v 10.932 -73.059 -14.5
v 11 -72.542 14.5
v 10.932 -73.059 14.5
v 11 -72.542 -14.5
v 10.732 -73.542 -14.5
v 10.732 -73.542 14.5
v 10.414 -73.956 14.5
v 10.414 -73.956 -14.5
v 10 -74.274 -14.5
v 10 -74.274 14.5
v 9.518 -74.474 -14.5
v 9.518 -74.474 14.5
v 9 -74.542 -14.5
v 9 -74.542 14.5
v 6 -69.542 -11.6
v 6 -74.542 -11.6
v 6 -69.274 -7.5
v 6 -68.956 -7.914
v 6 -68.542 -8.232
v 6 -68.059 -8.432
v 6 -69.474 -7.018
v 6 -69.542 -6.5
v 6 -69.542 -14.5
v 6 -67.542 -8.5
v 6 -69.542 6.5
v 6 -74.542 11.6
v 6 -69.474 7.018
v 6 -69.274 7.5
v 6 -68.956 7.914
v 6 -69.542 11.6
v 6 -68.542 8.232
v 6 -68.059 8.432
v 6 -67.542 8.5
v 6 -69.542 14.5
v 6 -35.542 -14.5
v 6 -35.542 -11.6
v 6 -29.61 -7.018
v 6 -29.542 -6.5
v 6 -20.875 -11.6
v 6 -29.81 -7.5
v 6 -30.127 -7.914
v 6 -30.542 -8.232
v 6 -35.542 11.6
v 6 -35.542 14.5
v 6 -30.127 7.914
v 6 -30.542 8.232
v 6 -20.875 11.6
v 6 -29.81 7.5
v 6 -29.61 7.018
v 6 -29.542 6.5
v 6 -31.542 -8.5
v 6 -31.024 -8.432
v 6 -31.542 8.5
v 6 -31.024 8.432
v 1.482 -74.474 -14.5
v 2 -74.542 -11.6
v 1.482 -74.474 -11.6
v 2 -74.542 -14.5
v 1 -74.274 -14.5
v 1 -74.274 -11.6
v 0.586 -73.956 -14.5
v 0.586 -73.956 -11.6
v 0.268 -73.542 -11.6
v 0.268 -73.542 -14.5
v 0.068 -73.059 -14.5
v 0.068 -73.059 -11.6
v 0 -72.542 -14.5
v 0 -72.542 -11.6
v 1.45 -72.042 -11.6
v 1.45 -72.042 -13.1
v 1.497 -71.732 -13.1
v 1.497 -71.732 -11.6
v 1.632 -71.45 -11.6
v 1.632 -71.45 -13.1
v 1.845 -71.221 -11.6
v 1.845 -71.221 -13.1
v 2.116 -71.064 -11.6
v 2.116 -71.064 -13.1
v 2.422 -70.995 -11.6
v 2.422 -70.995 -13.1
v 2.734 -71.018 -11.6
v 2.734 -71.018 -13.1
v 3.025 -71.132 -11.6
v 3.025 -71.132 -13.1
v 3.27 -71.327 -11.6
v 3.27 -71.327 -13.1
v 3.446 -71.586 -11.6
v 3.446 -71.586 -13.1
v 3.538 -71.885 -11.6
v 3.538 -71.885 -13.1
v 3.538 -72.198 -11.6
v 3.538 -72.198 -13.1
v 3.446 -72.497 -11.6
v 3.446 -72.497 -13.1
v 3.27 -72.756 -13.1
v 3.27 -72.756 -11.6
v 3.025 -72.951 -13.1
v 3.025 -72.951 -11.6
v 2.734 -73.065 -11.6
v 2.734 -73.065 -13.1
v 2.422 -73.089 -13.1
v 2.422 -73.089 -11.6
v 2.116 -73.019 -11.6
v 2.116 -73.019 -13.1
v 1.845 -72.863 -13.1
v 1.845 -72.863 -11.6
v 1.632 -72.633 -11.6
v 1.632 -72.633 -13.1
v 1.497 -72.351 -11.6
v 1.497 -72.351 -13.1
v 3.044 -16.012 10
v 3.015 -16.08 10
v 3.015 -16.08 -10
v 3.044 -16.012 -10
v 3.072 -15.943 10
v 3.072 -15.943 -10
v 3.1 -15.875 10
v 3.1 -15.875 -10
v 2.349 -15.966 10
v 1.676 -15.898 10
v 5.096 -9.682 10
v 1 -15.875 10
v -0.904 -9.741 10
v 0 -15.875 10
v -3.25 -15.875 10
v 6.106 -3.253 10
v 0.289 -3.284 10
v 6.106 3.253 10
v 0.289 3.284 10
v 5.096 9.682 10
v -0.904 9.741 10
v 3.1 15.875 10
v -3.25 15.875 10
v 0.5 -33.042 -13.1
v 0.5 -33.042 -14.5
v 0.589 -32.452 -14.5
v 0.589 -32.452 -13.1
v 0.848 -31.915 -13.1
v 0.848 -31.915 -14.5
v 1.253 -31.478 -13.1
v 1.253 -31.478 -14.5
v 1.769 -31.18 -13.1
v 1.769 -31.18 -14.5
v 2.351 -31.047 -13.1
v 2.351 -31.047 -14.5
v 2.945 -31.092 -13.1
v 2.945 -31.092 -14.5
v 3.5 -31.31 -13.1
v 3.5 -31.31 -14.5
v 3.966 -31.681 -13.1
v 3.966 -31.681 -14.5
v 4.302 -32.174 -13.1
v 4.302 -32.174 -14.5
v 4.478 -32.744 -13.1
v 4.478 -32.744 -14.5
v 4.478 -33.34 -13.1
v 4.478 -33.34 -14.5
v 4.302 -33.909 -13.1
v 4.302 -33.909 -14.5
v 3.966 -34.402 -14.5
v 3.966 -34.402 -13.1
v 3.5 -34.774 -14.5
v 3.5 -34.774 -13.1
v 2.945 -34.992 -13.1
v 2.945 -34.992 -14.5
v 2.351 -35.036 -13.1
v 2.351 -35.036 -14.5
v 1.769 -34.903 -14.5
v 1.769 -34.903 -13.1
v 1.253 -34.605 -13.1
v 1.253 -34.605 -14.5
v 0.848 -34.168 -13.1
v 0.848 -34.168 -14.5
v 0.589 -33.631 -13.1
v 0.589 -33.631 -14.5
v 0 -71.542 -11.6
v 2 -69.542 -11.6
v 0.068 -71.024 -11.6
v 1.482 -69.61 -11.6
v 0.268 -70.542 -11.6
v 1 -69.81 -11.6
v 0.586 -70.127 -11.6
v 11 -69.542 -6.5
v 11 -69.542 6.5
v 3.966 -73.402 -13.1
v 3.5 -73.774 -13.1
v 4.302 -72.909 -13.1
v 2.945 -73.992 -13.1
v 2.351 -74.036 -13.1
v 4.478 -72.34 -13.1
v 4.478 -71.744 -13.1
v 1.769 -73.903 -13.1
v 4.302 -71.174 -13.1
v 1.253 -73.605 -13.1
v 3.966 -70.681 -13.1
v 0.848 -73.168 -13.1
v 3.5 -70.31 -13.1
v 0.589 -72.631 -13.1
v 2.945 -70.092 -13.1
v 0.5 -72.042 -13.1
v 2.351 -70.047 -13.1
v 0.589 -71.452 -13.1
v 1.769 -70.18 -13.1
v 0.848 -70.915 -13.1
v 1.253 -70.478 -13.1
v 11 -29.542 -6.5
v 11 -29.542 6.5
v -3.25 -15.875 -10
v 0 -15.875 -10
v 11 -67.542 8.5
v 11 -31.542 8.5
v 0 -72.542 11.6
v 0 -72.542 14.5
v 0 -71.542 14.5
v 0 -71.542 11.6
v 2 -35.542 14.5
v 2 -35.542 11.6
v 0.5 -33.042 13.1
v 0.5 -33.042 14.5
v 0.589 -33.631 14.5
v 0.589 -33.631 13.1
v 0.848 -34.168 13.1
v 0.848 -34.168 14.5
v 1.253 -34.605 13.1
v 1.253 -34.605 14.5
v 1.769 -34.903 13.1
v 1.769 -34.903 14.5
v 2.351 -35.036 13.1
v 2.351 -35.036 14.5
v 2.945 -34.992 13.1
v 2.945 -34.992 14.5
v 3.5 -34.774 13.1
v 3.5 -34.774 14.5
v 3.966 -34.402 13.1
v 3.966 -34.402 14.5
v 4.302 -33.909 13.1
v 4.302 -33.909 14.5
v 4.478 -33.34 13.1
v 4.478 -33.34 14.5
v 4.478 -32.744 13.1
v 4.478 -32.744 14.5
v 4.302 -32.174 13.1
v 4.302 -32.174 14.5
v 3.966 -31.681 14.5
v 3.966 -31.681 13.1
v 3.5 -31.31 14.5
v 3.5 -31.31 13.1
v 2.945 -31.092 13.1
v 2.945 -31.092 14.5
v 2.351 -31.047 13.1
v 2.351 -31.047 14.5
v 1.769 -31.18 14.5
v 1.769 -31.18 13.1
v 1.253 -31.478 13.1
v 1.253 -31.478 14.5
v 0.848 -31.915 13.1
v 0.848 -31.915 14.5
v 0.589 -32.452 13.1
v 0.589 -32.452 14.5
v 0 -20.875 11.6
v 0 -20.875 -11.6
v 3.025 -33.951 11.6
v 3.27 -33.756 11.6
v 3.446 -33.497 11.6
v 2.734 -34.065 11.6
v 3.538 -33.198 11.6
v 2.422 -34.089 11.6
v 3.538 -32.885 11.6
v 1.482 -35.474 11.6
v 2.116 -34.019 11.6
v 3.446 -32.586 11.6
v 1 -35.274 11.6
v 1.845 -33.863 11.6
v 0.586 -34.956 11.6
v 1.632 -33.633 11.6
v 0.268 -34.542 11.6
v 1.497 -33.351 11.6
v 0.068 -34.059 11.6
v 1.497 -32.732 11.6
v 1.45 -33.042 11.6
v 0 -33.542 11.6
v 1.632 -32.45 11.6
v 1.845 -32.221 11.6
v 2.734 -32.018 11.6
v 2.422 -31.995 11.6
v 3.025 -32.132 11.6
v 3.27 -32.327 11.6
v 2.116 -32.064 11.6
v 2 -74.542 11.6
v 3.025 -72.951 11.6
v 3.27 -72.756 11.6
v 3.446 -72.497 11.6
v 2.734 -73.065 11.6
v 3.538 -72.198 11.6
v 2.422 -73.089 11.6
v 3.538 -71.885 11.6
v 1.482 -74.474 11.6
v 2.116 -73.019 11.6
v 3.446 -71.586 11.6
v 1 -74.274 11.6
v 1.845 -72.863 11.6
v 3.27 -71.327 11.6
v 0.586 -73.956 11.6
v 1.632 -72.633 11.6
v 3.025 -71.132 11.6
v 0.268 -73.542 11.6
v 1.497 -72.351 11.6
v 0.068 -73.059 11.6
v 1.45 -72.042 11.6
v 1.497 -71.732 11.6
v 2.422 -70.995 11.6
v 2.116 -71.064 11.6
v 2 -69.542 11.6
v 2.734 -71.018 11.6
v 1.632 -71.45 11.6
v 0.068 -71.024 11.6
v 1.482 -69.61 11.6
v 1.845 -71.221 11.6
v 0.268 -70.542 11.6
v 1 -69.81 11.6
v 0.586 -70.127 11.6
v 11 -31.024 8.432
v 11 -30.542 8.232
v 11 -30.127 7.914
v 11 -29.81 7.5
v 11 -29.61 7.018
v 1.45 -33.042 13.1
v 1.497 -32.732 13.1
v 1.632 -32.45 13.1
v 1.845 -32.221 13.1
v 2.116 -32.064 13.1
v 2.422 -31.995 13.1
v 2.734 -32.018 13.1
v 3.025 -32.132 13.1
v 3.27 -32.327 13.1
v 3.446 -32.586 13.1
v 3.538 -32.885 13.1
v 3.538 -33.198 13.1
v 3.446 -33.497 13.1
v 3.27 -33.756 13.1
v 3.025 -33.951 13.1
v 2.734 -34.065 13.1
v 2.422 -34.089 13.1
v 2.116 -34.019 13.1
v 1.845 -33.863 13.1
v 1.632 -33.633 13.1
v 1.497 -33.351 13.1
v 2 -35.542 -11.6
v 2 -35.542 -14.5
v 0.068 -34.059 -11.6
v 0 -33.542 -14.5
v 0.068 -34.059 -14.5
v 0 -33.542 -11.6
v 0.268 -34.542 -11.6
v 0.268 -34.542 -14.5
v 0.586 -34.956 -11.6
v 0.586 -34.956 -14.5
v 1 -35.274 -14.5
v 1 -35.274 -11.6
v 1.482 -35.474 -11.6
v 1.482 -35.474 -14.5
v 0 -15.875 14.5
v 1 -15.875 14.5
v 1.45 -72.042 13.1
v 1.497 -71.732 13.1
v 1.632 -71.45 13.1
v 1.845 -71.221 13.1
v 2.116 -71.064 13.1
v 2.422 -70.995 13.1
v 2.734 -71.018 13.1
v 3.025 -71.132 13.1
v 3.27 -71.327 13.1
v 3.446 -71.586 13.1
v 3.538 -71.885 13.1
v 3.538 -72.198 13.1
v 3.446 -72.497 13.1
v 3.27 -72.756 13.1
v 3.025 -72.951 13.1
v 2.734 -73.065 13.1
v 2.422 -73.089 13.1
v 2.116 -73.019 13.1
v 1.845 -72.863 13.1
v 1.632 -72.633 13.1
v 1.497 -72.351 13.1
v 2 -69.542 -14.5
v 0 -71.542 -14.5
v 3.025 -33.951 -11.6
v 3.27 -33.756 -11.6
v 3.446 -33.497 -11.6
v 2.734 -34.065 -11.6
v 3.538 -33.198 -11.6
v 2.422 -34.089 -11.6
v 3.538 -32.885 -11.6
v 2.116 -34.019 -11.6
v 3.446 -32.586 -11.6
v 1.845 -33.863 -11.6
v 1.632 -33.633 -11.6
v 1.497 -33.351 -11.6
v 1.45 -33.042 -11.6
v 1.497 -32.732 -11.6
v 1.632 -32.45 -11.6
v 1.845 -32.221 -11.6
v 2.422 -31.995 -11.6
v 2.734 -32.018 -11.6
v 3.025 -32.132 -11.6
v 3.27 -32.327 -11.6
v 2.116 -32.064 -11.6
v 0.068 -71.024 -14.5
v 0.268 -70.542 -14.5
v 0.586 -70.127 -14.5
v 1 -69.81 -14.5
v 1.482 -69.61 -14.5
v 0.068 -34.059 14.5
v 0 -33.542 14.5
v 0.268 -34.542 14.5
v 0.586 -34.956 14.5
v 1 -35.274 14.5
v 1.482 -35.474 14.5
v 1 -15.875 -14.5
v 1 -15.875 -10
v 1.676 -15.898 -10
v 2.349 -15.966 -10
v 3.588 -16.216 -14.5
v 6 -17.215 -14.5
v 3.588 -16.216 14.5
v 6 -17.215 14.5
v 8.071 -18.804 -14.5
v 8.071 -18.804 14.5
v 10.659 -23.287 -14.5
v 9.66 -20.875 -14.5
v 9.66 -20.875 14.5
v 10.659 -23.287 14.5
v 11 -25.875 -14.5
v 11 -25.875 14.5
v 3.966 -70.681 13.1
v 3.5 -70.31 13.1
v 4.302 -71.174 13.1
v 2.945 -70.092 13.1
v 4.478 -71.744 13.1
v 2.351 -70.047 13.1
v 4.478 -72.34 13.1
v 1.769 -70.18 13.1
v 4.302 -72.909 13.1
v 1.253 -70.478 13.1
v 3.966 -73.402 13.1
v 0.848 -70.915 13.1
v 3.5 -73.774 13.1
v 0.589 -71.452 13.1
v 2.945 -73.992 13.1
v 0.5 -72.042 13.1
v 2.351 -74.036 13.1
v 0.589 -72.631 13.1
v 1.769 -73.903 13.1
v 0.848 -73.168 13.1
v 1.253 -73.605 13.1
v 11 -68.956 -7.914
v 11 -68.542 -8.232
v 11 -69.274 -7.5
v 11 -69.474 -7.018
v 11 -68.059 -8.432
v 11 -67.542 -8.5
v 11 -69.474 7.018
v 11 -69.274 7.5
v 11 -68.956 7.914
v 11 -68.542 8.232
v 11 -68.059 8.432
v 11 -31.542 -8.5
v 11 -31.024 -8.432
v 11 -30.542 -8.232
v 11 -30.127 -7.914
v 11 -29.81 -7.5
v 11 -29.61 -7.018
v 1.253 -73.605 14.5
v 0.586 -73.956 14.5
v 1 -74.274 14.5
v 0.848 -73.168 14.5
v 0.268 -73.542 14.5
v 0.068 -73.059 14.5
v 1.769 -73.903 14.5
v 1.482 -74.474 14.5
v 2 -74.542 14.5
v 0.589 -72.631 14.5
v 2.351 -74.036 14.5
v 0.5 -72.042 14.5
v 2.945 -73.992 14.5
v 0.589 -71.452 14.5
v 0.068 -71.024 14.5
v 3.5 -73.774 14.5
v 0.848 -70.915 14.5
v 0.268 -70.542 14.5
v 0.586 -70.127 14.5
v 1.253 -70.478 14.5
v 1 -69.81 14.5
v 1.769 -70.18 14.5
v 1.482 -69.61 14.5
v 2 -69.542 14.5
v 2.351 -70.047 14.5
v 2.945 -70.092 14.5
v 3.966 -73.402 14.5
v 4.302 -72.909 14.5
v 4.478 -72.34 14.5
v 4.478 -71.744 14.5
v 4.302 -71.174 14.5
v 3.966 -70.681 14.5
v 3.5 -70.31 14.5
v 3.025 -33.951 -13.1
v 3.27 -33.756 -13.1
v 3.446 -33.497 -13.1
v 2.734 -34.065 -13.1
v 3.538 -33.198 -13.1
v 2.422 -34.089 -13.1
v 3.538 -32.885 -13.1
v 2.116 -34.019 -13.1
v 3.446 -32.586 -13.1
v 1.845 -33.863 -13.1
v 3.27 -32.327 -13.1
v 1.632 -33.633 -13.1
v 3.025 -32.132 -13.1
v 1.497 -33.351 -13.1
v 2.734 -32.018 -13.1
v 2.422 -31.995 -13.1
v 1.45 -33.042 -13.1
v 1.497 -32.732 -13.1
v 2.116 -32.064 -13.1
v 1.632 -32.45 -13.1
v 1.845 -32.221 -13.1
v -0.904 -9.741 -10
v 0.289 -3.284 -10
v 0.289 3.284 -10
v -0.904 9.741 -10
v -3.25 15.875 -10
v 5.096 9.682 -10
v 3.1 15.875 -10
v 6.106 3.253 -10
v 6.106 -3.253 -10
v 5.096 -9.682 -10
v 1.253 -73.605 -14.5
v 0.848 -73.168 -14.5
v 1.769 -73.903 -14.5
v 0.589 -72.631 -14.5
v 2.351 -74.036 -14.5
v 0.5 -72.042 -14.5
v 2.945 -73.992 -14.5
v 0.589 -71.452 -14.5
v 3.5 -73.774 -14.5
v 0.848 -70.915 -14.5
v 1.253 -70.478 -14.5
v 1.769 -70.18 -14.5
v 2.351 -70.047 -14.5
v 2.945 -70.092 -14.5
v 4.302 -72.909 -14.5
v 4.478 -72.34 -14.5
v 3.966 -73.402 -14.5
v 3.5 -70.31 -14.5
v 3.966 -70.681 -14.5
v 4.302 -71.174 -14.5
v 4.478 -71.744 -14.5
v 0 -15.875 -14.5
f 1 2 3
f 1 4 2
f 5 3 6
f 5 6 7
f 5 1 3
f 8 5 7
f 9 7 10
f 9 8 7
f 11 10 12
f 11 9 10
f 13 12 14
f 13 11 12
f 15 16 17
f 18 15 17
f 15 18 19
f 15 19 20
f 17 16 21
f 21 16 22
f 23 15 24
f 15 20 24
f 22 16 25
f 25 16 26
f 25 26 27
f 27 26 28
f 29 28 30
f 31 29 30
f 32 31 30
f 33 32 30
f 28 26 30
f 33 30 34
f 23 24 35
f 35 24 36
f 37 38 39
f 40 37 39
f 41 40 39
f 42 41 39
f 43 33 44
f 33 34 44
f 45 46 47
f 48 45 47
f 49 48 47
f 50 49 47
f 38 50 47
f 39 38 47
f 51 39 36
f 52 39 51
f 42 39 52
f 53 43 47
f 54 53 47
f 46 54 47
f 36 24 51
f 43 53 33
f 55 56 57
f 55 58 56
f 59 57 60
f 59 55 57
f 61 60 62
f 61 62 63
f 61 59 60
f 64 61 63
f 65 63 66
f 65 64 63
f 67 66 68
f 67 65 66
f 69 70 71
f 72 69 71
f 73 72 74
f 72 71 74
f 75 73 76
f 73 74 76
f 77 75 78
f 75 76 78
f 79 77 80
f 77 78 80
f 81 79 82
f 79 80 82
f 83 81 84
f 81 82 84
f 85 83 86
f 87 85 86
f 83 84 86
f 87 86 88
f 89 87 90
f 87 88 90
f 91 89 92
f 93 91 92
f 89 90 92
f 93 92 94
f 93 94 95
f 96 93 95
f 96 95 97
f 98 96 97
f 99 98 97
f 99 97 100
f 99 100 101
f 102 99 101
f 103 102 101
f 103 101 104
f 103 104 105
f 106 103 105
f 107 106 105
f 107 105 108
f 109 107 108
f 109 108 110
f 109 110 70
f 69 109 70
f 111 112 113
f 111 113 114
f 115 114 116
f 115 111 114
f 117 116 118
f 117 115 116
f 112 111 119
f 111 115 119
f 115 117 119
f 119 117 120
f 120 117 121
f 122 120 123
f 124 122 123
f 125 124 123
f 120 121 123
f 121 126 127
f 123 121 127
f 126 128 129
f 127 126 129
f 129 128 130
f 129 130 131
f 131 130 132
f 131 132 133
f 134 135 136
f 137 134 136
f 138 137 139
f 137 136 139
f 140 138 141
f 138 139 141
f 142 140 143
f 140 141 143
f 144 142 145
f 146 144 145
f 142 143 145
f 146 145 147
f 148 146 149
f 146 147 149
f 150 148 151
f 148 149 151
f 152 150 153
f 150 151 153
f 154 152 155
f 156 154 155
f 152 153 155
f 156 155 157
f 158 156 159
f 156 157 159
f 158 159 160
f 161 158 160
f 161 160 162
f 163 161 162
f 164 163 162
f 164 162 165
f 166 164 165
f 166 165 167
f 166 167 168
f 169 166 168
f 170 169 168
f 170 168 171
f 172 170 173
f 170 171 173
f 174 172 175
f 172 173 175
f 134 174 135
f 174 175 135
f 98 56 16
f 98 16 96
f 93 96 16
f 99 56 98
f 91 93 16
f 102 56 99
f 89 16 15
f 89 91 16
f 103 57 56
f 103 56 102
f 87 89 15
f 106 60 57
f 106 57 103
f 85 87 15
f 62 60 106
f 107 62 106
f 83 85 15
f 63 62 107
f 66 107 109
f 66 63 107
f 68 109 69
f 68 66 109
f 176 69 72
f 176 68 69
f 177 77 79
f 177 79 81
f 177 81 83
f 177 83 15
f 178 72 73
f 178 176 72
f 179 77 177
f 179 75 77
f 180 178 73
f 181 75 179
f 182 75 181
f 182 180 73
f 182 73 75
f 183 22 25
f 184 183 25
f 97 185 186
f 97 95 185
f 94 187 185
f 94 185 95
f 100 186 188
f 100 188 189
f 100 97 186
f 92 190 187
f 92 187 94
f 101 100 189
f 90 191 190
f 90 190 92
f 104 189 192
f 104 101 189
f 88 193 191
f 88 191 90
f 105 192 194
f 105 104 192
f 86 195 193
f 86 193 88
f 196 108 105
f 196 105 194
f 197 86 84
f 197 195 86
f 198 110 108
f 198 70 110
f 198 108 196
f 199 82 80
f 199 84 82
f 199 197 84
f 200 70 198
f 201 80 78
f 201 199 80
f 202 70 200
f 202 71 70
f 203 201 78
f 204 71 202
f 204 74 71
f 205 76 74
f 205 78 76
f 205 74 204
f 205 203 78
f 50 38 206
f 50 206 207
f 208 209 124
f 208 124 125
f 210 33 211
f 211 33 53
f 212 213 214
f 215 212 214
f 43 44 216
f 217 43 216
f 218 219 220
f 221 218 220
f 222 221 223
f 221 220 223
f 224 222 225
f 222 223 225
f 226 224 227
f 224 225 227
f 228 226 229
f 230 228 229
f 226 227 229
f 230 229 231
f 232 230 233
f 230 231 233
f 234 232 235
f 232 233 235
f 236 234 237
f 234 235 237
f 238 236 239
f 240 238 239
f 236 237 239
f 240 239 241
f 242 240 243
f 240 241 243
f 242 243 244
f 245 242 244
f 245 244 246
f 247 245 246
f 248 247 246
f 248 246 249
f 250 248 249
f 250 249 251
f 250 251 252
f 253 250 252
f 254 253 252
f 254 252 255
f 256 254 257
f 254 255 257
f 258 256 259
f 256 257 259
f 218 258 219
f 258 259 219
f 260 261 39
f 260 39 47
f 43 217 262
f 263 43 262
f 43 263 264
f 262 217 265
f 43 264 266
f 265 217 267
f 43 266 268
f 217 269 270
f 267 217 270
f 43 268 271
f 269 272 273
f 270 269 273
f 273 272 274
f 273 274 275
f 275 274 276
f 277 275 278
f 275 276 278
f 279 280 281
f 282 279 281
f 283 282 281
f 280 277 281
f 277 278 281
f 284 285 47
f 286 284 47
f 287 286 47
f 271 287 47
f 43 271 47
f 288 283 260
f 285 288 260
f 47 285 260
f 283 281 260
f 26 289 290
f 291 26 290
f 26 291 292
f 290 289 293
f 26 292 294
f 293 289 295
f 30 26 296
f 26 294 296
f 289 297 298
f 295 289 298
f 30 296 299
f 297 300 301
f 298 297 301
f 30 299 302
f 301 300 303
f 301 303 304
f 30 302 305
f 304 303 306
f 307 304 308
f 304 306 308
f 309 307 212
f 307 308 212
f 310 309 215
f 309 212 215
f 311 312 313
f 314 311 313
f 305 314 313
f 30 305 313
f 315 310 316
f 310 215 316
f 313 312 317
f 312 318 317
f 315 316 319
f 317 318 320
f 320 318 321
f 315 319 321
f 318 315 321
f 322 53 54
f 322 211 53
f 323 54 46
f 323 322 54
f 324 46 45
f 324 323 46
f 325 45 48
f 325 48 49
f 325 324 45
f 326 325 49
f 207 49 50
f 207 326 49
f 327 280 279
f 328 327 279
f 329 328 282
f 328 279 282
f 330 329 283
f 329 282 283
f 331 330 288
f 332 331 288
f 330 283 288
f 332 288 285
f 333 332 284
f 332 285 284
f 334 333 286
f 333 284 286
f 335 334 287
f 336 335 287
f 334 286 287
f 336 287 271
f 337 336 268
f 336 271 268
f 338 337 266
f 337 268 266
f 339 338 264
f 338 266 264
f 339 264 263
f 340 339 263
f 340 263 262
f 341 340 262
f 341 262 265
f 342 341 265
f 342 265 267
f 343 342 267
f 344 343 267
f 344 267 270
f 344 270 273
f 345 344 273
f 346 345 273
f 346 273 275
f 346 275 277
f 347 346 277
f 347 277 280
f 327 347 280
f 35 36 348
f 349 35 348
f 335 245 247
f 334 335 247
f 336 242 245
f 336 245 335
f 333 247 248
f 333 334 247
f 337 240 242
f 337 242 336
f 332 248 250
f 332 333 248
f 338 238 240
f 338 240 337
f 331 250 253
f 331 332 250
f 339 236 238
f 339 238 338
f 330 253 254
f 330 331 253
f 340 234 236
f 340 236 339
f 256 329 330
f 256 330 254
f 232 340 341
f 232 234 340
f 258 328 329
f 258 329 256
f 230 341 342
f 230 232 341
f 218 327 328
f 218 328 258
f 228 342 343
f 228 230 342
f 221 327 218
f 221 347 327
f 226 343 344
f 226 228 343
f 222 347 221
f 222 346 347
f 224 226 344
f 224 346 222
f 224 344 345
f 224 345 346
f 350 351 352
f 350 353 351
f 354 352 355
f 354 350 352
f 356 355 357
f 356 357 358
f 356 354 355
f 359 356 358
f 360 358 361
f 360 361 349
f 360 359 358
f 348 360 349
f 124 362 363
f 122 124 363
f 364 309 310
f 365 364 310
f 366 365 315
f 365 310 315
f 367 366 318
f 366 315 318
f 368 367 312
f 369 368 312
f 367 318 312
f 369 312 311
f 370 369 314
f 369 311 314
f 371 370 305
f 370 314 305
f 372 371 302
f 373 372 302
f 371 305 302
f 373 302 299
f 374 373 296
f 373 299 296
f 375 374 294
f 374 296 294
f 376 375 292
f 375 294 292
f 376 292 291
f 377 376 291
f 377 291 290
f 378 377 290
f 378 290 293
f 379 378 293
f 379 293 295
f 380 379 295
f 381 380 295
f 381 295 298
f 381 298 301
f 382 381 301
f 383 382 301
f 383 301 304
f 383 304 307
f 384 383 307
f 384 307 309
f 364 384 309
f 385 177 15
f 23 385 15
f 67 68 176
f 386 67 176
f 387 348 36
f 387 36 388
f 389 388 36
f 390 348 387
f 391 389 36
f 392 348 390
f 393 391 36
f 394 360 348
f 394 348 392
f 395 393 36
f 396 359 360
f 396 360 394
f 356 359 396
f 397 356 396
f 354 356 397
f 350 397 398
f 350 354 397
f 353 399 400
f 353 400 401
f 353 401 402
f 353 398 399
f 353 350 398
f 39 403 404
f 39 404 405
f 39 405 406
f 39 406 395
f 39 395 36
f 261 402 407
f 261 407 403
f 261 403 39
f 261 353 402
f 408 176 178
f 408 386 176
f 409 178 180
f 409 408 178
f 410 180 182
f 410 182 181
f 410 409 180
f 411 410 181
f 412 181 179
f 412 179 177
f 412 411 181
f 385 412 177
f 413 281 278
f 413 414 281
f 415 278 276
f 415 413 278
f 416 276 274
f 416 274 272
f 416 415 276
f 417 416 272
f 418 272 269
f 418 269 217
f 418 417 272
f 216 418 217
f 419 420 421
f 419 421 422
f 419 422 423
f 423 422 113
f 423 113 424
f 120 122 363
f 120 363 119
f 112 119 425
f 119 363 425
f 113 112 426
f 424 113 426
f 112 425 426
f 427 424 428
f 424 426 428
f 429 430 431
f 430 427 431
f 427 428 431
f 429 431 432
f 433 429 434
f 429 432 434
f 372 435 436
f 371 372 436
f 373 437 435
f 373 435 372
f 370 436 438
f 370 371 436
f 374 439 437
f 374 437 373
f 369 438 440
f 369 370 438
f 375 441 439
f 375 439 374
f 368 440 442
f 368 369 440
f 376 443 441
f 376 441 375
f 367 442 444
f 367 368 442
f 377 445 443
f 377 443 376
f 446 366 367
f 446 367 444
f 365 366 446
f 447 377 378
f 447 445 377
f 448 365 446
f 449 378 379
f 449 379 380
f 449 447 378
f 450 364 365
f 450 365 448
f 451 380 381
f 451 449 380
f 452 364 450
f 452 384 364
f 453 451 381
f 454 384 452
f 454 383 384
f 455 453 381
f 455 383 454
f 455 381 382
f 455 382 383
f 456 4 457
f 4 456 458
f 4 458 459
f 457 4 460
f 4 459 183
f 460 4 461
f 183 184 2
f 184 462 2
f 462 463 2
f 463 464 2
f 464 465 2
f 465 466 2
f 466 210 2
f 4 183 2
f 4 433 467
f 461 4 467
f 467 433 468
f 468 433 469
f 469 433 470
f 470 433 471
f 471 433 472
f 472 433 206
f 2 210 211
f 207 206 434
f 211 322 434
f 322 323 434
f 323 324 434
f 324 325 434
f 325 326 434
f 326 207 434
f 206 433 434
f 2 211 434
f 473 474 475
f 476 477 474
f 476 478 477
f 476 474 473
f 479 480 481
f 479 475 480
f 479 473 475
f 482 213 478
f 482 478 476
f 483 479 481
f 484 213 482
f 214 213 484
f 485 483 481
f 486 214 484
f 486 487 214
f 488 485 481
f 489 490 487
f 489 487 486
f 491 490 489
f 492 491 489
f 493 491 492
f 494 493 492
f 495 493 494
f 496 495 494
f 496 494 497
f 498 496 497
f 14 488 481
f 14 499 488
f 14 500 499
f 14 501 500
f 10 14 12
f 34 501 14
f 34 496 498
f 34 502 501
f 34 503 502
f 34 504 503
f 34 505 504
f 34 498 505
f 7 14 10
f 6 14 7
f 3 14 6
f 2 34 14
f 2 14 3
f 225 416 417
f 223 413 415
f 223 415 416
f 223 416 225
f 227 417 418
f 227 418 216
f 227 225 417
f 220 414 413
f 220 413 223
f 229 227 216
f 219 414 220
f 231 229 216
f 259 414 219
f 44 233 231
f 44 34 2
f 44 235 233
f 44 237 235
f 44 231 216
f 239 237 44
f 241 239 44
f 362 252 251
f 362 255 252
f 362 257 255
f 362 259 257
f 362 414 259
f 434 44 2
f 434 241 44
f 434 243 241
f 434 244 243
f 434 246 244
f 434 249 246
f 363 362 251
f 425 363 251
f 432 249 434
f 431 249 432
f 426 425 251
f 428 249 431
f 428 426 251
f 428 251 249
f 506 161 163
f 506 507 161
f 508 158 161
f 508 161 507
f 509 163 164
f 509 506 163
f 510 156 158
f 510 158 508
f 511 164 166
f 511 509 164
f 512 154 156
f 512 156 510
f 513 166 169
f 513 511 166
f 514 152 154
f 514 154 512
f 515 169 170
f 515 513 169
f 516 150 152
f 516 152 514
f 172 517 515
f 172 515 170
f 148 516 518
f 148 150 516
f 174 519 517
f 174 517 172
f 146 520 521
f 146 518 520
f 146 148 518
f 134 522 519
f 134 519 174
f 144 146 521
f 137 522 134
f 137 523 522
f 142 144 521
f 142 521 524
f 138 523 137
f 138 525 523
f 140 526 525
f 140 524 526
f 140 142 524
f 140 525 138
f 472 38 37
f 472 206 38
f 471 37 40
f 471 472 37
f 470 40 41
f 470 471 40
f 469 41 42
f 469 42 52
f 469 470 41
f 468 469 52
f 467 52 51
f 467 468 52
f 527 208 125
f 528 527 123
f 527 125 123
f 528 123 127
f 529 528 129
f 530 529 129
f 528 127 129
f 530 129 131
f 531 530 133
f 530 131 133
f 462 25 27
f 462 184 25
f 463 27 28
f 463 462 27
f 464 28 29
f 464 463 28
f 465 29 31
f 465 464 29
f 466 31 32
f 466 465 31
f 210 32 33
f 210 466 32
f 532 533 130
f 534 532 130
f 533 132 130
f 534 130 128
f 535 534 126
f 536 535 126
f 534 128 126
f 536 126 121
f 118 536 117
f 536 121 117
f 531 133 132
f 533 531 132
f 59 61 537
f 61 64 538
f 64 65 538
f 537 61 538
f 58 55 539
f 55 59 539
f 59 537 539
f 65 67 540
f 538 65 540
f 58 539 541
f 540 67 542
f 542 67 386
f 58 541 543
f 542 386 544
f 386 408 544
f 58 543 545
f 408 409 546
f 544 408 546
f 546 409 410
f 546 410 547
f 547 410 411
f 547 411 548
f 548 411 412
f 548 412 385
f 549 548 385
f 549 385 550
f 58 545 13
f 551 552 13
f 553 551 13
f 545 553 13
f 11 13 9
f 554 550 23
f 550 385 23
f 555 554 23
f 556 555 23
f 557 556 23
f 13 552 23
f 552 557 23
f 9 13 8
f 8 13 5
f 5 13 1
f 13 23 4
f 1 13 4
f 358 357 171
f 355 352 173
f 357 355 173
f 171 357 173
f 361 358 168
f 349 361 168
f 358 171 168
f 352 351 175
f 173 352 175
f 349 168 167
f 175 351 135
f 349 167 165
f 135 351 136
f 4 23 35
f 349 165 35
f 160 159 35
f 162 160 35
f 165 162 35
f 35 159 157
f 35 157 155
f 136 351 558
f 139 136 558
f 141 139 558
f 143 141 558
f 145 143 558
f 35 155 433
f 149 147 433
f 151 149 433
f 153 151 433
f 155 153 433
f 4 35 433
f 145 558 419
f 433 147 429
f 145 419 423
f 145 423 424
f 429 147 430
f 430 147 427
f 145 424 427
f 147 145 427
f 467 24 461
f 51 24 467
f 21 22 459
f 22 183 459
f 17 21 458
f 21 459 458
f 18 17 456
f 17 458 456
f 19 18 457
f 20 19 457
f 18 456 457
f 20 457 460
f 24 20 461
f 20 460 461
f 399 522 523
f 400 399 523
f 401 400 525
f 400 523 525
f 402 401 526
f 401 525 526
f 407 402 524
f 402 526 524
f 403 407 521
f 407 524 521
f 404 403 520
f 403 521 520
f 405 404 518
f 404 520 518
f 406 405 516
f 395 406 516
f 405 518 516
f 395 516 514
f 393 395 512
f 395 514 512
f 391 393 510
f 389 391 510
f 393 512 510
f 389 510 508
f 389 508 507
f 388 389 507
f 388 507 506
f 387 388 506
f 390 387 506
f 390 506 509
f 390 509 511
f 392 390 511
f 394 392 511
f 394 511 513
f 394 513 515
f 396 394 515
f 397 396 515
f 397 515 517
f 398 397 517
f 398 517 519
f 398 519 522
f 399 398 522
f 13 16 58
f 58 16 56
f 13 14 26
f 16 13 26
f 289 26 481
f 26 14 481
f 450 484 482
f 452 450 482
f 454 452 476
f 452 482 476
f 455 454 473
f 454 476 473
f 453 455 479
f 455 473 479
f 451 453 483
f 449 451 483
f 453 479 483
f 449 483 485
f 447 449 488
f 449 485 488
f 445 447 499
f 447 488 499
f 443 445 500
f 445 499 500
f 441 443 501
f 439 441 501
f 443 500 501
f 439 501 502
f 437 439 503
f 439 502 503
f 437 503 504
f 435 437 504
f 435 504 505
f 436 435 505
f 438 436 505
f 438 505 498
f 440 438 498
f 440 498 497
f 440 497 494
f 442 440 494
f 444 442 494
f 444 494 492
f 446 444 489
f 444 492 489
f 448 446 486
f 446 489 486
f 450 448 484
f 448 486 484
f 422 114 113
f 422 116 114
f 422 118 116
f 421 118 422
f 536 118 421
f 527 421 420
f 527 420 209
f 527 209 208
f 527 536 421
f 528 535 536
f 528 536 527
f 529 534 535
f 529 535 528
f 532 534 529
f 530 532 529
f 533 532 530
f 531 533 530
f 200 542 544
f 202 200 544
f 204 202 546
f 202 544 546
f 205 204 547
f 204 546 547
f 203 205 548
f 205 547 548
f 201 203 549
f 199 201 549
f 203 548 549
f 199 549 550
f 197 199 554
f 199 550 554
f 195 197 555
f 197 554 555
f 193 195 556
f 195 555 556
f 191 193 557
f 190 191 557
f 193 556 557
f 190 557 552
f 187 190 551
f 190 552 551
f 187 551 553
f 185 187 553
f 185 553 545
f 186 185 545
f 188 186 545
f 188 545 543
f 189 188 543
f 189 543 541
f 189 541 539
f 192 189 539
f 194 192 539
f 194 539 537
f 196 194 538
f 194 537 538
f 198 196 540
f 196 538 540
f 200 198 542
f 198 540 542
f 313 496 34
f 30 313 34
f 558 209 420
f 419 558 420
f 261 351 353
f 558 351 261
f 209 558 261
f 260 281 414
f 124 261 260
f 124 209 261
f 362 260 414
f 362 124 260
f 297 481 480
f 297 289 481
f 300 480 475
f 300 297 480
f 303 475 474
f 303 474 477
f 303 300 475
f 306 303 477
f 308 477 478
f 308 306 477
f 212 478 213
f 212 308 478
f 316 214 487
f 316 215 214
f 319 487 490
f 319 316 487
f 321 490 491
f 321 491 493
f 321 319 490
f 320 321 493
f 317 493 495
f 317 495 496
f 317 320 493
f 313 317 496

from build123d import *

# Parameters (mm, degrees)
BOSS_EXTRUDE5_DEPTH = 10
BOSS_EXTRUDE6_DEPTH = 14.5
BOSS_EXTRUDE7_REACH = 63.425
SKETCH28_W          = 11
SKETCH28_H          = 29
SKETCH37_W          = 23.2
SKETCH37_H          = 14.666666667
CUT_EXTRUDE10_DEPTH = 6
SKETCH38_W          = 23.2
SKETCH38_H          = 5
CUT_EXTRUDE11_DEPTH = 6
SKETCH39_R          = 1.05
CUT_EXTRUDE12_DEPTH = 81.736980805
SKETCH40_R          = 2
CUT_EXTRUDE13_DEPTH = 1.4
SKETCH41_R          = 2
CUT_EXTRUDE14_DEPTH = 1.4
SKETCH42_W          = 17
SKETCH42_H          = 40
CUT_EXTRUDE15_DEPTH = 77.175521458
FILLET2_R           = 2
CUT_EXTRUDE16_DEPTH = 80.232001549
BOSS_EXTRUDE8_DEPTH = 10
FILLET3_R           = 10


with BuildPart() as part:
    # Sketch25 → Boss-Extrude5 (new, symmetric)
    with BuildSketch(Plane.XY):
        with BuildLine():
            Line((0, 15.875), (6.35, 15.875))
            ThreePointArc((6.35, 15.875), (9.840958299, 0), (6.35, -15.875))
            Line((6.35, -15.875), (0, -15.875))
            ThreePointArc((0, -15.875), (4.187196601, 0), (0, 15.875))
        make_face()
    extrude(amount=BOSS_EXTRUDE5_DEPTH, both=True)


with BuildPart() as body_2:
    # Sketch27 → Boss-Extrude6 (new, symmetric)
    with BuildSketch(Plane.XY):
        Polygon((0, -30.541666667), (11, -30.541666667), (11, -74.541666667), (0, -74.541666667), (0, -69.541666667), (6, -69.541666667), (6, -35.541666667), (0, -35.541666667), align=None)
    extrude(amount=BOSS_EXTRUDE6_DEPTH, both=True)

    # Sketch28 → Boss-Extrude7 (add, up to next)
    with BuildSketch(Plane.XZ.offset(15.875), mode=Mode.PRIVATE) as boss_extrude7_sk1:
        with Locations((5.5, 0)):
            Rectangle(SKETCH28_W, SKETCH28_H)
    boss_extrude7_tool1 = extrude(boss_extrude7_sk1.sketch, amount=BOSS_EXTRUDE7_REACH, mode=Mode.PRIVATE) - body_2.part

    add(part.part)  # Boss-Extrude7 merges part
    add(boss_extrude7_tool1.solids().sort_by_distance((5.5, -15.875, 0))[0])

    # Sketch37 → Cut-Extrude10 (cut)
    with BuildSketch(Plane.ZY):
        with Locations((0, -28.208333334)):
            Rectangle(SKETCH37_W, SKETCH37_H)
    extrude(amount=-CUT_EXTRUDE10_DEPTH, mode=Mode.SUBTRACT)

    # Sketch38 → Cut-Extrude11 (cut)
    with BuildSketch(Plane.ZY):
        with Locations((0, -72.041666667)):
            Rectangle(SKETCH38_W, SKETCH38_H)
    extrude(amount=-CUT_EXTRUDE11_DEPTH, mode=Mode.SUBTRACT)

    # Sketch39 → Cut-Extrude12 (cut, through all)
    with BuildSketch(Plane(origin=(0, 0, -14.5), x_dir=(-1, 0, 0), z_dir=(0, 0, -1))):
        with Locations((-2.5, -33.041666667)):
            Circle(SKETCH39_R)
        with Locations((-2.5, -72.041666667)):
            Circle(SKETCH39_R)
    extrude(amount=-CUT_EXTRUDE12_DEPTH, mode=Mode.SUBTRACT)

    # Sketch40 → Cut-Extrude13 (cut)
    with BuildSketch(Plane(origin=(0, 0, -14.5), x_dir=(-1, 0, 0), z_dir=(0, 0, -1))):
        with Locations((-2.5, -33.041666667)):
            Circle(SKETCH40_R)
        with Locations((-2.5, -72.041666667)):
            Circle(SKETCH40_R)
    extrude(amount=-CUT_EXTRUDE13_DEPTH, mode=Mode.SUBTRACT)

    # Sketch41 → Cut-Extrude14 (cut)
    with BuildSketch(Plane.XY.offset(14.5)):
        with Locations(Location((2.5, -33.041666667, 0), (0, 0, 180))):
            Circle(SKETCH41_R)
        with Locations(Location((2.5, -72.041666667, 0), (0, 0, 180))):
            Circle(SKETCH41_R)
    extrude(amount=-CUT_EXTRUDE14_DEPTH, mode=Mode.SUBTRACT)

    # Sketch42 → Cut-Extrude15 (cut, through all)
    with BuildSketch(Plane.ZY.offset(-6)):
        with Locations((0, -49.541666667)):
            Rectangle(SKETCH42_W, SKETCH42_H)
    extrude(amount=-CUT_EXTRUDE15_DEPTH, mode=Mode.SUBTRACT)

    # Fillet2
    fillet2_edges = [body_2.edges().sort_by_distance(p)[0] for p in [
        (8.5, -69.541666667, -8.5),
        (8.5, -29.541666667, -8.5),
        (8.5, -29.541666667, 8.5),
        (8.5, -69.541666667, 8.5),
        (0, -35.541666667, 13.05),
        (0, -69.541666667, 13.05),
        (0, -74.541666667, 13.05),
        (11, -74.541666667, 0),
        (0, -35.541666667, -13.05),
        (0, -74.541666667, -13.05),
        (0, -69.541666667, -13.05),
    ]]
    fillet(fillet2_edges, radius=FILLET2_R)

    # Sketch44 → Cut-Extrude16 (cut, through all)
    with BuildSketch(Plane.XY.offset(10)):
        with BuildLine():
            Line((6.35, -15.875), (0, -15.875))
            ThreePointArc((0, -15.875), (4.187196601, 0), (0, 15.875))
            Line((0, 15.875), (6.35, 15.875))
            ThreePointArc((6.35, 15.875), (9.840958299, 0), (6.35, -15.875))
        make_face()
    extrude(amount=-CUT_EXTRUDE16_DEPTH, mode=Mode.SUBTRACT)

    # Sketch43 → Boss-Extrude8 (add, symmetric)
    with BuildSketch(Plane.XY):
        with BuildLine():
            Line((-3.25, 15.875), (3.1, 15.875))
            ThreePointArc((3.1, 15.875), (6.232422098, 0), (3.1, -15.875))
            Line((3.1, -15.875), (-3.25, -15.875))
            ThreePointArc((-3.25, -15.875), (0.439252949, 0), (-3.25, 15.875))
        make_face()
    extrude(amount=BOSS_EXTRUDE8_DEPTH, both=True)

    # Fillet3
    # the kernel refuses this fillet: 10 mm, written as the material it takes off along each edge
    with BuildSketch(Plane(origin=(11, -15.875, 39.5), x_dir=(-1, 0, 0), z_dir=(0, 0, -1))) as fillet3_piece_1_section:
        with BuildLine():
            CenterArc((FILLET3_R, -FILLET3_R), FILLET3_R, 90, 90)
            Line((0, -FILLET3_R), (0, 0))
            Line((0, 0), (FILLET3_R, 0))
        make_face()
    fillet3_piece_1 = extrude(amount=79, mode=Mode.PRIVATE)
    fillet3_piece_1 = split(fillet3_piece_1, bisect_by=Plane(origin=(2.190951885, -15.815672455, 10), z_dir=(0, 0, 1)), keep=Keep.TOP, mode=Mode.PRIVATE)
    fillet3_piece_1 = fillet3_piece_1 & Plane(origin=(-35.560747051, 0, 24.75), x_dir=(0.925049424055658, 0.3798467625955178, 0), z_dir=(0, 0, 1)) * Cylinder(41.793169149, 198, mode=Mode.PRIVATE)
    add(fillet3_piece_1, mode=Mode.SUBTRACT)
    with BuildSketch(Plane(origin=(11, -15.875, 39.5), x_dir=(-1, 0, 0), z_dir=(0, 0, -1))) as fillet3_piece_2_section:
        with BuildLine():
            CenterArc((FILLET3_R, -FILLET3_R), FILLET3_R, 90, 90)
            Line((0, -FILLET3_R), (0, 0))
            Line((0, 0), (FILLET3_R, 0))
        make_face()
    fillet3_piece_2 = extrude(amount=79, mode=Mode.PRIVATE)
    fillet3_piece_2 = split(fillet3_piece_2, bisect_by=Plane(origin=(8.886802667, -18.192463431, 10), z_dir=(0, 0, 1)), keep=Keep.TOP, mode=Mode.PRIVATE)
    fillet3_piece_2 = fillet3_piece_2 - Plane(origin=(-35.560747051, 0, 24.75), x_dir=(0.925049424055658, 0.3798467625955178, 0), z_dir=(0, 0, 1)) * Cylinder(41.793169149, 198, mode=Mode.PRIVATE)
    add(fillet3_piece_2, mode=Mode.SUBTRACT)
    with BuildSketch(Plane(origin=(11, -15.875, 39.5), x_dir=(-1, 0, 0), z_dir=(0, 0, -1))) as fillet3_piece_3_section:
        with BuildLine():
            CenterArc((FILLET3_R, -FILLET3_R), FILLET3_R, 90, 90)
            Line((0, -FILLET3_R), (0, 0))
            Line((0, 0), (FILLET3_R, 0))
        make_face()
    fillet3_piece_3 = extrude(amount=79, mode=Mode.PRIVATE)
    fillet3_piece_3 = split(fillet3_piece_3, bisect_by=Plane(origin=(8.886802667, -18.192463431, 10), z_dir=(0, 0, -1)), keep=Keep.TOP, mode=Mode.PRIVATE)
    fillet3_piece_3 = fillet3_piece_3 - Plane(origin=(-35.560747051, 0, 0), x_dir=(0.925049424055658, 0.3798467625955178, 0), z_dir=(0, 0, 1)) * Cylinder(41.793169149, 198, mode=Mode.PRIVATE)
    fillet3_piece_3 = split(fillet3_piece_3, bisect_by=Plane(origin=(8.886802667, -18.192463431, -10), z_dir=(0, 0, 1)), keep=Keep.TOP, mode=Mode.PRIVATE)
    add(fillet3_piece_3, mode=Mode.SUBTRACT)
    with BuildSketch(Plane(origin=(11, -15.875, 39.5), x_dir=(-1, 0, 0), z_dir=(0, 0, -1))) as fillet3_piece_4_section:
        with BuildLine():
            CenterArc((FILLET3_R, -FILLET3_R), FILLET3_R, 90, 90)
            Line((0, -FILLET3_R), (0, 0))
            Line((0, 0), (FILLET3_R, 0))
        make_face()
    fillet3_piece_4 = extrude(amount=79, mode=Mode.PRIVATE)
    fillet3_piece_4 = fillet3_piece_4 & Plane(origin=(-35.560747051, 0, -24.75), x_dir=(0.925049424055658, 0.3798467625955178, 0), z_dir=(0, 0, 1)) * Cylinder(41.793169149, 198, mode=Mode.PRIVATE)
    fillet3_piece_4 = split(fillet3_piece_4, bisect_by=Plane(origin=(2.190951885, -15.815672455, -10), z_dir=(0, 0, -1)), keep=Keep.TOP, mode=Mode.PRIVATE)
    add(fillet3_piece_4, mode=Mode.SUBTRACT)
    with BuildSketch(Plane(origin=(11, -15.875, 39.5), x_dir=(-1, 0, 0), z_dir=(0, 0, -1))) as fillet3_piece_5_section:
        with BuildLine():
            CenterArc((FILLET3_R, -FILLET3_R), FILLET3_R, 90, 90)
            Line((0, -FILLET3_R), (0, 0))
            Line((0, 0), (FILLET3_R, 0))
        make_face()
    fillet3_piece_5 = extrude(amount=79, mode=Mode.PRIVATE)
    fillet3_piece_5 = fillet3_piece_5 - Plane(origin=(-35.560747051, 0, -24.75), x_dir=(0.925049424055658, 0.3798467625955178, 0), z_dir=(0, 0, 1)) * Cylinder(41.793169149, 198, mode=Mode.PRIVATE)
    fillet3_piece_5 = split(fillet3_piece_5, bisect_by=Plane(origin=(8.886802667, -18.192463431, -10), z_dir=(0, 0, -1)), keep=Keep.TOP, mode=Mode.PRIVATE)
    add(fillet3_piece_5, mode=Mode.SUBTRACT)


solid = body_2.part
